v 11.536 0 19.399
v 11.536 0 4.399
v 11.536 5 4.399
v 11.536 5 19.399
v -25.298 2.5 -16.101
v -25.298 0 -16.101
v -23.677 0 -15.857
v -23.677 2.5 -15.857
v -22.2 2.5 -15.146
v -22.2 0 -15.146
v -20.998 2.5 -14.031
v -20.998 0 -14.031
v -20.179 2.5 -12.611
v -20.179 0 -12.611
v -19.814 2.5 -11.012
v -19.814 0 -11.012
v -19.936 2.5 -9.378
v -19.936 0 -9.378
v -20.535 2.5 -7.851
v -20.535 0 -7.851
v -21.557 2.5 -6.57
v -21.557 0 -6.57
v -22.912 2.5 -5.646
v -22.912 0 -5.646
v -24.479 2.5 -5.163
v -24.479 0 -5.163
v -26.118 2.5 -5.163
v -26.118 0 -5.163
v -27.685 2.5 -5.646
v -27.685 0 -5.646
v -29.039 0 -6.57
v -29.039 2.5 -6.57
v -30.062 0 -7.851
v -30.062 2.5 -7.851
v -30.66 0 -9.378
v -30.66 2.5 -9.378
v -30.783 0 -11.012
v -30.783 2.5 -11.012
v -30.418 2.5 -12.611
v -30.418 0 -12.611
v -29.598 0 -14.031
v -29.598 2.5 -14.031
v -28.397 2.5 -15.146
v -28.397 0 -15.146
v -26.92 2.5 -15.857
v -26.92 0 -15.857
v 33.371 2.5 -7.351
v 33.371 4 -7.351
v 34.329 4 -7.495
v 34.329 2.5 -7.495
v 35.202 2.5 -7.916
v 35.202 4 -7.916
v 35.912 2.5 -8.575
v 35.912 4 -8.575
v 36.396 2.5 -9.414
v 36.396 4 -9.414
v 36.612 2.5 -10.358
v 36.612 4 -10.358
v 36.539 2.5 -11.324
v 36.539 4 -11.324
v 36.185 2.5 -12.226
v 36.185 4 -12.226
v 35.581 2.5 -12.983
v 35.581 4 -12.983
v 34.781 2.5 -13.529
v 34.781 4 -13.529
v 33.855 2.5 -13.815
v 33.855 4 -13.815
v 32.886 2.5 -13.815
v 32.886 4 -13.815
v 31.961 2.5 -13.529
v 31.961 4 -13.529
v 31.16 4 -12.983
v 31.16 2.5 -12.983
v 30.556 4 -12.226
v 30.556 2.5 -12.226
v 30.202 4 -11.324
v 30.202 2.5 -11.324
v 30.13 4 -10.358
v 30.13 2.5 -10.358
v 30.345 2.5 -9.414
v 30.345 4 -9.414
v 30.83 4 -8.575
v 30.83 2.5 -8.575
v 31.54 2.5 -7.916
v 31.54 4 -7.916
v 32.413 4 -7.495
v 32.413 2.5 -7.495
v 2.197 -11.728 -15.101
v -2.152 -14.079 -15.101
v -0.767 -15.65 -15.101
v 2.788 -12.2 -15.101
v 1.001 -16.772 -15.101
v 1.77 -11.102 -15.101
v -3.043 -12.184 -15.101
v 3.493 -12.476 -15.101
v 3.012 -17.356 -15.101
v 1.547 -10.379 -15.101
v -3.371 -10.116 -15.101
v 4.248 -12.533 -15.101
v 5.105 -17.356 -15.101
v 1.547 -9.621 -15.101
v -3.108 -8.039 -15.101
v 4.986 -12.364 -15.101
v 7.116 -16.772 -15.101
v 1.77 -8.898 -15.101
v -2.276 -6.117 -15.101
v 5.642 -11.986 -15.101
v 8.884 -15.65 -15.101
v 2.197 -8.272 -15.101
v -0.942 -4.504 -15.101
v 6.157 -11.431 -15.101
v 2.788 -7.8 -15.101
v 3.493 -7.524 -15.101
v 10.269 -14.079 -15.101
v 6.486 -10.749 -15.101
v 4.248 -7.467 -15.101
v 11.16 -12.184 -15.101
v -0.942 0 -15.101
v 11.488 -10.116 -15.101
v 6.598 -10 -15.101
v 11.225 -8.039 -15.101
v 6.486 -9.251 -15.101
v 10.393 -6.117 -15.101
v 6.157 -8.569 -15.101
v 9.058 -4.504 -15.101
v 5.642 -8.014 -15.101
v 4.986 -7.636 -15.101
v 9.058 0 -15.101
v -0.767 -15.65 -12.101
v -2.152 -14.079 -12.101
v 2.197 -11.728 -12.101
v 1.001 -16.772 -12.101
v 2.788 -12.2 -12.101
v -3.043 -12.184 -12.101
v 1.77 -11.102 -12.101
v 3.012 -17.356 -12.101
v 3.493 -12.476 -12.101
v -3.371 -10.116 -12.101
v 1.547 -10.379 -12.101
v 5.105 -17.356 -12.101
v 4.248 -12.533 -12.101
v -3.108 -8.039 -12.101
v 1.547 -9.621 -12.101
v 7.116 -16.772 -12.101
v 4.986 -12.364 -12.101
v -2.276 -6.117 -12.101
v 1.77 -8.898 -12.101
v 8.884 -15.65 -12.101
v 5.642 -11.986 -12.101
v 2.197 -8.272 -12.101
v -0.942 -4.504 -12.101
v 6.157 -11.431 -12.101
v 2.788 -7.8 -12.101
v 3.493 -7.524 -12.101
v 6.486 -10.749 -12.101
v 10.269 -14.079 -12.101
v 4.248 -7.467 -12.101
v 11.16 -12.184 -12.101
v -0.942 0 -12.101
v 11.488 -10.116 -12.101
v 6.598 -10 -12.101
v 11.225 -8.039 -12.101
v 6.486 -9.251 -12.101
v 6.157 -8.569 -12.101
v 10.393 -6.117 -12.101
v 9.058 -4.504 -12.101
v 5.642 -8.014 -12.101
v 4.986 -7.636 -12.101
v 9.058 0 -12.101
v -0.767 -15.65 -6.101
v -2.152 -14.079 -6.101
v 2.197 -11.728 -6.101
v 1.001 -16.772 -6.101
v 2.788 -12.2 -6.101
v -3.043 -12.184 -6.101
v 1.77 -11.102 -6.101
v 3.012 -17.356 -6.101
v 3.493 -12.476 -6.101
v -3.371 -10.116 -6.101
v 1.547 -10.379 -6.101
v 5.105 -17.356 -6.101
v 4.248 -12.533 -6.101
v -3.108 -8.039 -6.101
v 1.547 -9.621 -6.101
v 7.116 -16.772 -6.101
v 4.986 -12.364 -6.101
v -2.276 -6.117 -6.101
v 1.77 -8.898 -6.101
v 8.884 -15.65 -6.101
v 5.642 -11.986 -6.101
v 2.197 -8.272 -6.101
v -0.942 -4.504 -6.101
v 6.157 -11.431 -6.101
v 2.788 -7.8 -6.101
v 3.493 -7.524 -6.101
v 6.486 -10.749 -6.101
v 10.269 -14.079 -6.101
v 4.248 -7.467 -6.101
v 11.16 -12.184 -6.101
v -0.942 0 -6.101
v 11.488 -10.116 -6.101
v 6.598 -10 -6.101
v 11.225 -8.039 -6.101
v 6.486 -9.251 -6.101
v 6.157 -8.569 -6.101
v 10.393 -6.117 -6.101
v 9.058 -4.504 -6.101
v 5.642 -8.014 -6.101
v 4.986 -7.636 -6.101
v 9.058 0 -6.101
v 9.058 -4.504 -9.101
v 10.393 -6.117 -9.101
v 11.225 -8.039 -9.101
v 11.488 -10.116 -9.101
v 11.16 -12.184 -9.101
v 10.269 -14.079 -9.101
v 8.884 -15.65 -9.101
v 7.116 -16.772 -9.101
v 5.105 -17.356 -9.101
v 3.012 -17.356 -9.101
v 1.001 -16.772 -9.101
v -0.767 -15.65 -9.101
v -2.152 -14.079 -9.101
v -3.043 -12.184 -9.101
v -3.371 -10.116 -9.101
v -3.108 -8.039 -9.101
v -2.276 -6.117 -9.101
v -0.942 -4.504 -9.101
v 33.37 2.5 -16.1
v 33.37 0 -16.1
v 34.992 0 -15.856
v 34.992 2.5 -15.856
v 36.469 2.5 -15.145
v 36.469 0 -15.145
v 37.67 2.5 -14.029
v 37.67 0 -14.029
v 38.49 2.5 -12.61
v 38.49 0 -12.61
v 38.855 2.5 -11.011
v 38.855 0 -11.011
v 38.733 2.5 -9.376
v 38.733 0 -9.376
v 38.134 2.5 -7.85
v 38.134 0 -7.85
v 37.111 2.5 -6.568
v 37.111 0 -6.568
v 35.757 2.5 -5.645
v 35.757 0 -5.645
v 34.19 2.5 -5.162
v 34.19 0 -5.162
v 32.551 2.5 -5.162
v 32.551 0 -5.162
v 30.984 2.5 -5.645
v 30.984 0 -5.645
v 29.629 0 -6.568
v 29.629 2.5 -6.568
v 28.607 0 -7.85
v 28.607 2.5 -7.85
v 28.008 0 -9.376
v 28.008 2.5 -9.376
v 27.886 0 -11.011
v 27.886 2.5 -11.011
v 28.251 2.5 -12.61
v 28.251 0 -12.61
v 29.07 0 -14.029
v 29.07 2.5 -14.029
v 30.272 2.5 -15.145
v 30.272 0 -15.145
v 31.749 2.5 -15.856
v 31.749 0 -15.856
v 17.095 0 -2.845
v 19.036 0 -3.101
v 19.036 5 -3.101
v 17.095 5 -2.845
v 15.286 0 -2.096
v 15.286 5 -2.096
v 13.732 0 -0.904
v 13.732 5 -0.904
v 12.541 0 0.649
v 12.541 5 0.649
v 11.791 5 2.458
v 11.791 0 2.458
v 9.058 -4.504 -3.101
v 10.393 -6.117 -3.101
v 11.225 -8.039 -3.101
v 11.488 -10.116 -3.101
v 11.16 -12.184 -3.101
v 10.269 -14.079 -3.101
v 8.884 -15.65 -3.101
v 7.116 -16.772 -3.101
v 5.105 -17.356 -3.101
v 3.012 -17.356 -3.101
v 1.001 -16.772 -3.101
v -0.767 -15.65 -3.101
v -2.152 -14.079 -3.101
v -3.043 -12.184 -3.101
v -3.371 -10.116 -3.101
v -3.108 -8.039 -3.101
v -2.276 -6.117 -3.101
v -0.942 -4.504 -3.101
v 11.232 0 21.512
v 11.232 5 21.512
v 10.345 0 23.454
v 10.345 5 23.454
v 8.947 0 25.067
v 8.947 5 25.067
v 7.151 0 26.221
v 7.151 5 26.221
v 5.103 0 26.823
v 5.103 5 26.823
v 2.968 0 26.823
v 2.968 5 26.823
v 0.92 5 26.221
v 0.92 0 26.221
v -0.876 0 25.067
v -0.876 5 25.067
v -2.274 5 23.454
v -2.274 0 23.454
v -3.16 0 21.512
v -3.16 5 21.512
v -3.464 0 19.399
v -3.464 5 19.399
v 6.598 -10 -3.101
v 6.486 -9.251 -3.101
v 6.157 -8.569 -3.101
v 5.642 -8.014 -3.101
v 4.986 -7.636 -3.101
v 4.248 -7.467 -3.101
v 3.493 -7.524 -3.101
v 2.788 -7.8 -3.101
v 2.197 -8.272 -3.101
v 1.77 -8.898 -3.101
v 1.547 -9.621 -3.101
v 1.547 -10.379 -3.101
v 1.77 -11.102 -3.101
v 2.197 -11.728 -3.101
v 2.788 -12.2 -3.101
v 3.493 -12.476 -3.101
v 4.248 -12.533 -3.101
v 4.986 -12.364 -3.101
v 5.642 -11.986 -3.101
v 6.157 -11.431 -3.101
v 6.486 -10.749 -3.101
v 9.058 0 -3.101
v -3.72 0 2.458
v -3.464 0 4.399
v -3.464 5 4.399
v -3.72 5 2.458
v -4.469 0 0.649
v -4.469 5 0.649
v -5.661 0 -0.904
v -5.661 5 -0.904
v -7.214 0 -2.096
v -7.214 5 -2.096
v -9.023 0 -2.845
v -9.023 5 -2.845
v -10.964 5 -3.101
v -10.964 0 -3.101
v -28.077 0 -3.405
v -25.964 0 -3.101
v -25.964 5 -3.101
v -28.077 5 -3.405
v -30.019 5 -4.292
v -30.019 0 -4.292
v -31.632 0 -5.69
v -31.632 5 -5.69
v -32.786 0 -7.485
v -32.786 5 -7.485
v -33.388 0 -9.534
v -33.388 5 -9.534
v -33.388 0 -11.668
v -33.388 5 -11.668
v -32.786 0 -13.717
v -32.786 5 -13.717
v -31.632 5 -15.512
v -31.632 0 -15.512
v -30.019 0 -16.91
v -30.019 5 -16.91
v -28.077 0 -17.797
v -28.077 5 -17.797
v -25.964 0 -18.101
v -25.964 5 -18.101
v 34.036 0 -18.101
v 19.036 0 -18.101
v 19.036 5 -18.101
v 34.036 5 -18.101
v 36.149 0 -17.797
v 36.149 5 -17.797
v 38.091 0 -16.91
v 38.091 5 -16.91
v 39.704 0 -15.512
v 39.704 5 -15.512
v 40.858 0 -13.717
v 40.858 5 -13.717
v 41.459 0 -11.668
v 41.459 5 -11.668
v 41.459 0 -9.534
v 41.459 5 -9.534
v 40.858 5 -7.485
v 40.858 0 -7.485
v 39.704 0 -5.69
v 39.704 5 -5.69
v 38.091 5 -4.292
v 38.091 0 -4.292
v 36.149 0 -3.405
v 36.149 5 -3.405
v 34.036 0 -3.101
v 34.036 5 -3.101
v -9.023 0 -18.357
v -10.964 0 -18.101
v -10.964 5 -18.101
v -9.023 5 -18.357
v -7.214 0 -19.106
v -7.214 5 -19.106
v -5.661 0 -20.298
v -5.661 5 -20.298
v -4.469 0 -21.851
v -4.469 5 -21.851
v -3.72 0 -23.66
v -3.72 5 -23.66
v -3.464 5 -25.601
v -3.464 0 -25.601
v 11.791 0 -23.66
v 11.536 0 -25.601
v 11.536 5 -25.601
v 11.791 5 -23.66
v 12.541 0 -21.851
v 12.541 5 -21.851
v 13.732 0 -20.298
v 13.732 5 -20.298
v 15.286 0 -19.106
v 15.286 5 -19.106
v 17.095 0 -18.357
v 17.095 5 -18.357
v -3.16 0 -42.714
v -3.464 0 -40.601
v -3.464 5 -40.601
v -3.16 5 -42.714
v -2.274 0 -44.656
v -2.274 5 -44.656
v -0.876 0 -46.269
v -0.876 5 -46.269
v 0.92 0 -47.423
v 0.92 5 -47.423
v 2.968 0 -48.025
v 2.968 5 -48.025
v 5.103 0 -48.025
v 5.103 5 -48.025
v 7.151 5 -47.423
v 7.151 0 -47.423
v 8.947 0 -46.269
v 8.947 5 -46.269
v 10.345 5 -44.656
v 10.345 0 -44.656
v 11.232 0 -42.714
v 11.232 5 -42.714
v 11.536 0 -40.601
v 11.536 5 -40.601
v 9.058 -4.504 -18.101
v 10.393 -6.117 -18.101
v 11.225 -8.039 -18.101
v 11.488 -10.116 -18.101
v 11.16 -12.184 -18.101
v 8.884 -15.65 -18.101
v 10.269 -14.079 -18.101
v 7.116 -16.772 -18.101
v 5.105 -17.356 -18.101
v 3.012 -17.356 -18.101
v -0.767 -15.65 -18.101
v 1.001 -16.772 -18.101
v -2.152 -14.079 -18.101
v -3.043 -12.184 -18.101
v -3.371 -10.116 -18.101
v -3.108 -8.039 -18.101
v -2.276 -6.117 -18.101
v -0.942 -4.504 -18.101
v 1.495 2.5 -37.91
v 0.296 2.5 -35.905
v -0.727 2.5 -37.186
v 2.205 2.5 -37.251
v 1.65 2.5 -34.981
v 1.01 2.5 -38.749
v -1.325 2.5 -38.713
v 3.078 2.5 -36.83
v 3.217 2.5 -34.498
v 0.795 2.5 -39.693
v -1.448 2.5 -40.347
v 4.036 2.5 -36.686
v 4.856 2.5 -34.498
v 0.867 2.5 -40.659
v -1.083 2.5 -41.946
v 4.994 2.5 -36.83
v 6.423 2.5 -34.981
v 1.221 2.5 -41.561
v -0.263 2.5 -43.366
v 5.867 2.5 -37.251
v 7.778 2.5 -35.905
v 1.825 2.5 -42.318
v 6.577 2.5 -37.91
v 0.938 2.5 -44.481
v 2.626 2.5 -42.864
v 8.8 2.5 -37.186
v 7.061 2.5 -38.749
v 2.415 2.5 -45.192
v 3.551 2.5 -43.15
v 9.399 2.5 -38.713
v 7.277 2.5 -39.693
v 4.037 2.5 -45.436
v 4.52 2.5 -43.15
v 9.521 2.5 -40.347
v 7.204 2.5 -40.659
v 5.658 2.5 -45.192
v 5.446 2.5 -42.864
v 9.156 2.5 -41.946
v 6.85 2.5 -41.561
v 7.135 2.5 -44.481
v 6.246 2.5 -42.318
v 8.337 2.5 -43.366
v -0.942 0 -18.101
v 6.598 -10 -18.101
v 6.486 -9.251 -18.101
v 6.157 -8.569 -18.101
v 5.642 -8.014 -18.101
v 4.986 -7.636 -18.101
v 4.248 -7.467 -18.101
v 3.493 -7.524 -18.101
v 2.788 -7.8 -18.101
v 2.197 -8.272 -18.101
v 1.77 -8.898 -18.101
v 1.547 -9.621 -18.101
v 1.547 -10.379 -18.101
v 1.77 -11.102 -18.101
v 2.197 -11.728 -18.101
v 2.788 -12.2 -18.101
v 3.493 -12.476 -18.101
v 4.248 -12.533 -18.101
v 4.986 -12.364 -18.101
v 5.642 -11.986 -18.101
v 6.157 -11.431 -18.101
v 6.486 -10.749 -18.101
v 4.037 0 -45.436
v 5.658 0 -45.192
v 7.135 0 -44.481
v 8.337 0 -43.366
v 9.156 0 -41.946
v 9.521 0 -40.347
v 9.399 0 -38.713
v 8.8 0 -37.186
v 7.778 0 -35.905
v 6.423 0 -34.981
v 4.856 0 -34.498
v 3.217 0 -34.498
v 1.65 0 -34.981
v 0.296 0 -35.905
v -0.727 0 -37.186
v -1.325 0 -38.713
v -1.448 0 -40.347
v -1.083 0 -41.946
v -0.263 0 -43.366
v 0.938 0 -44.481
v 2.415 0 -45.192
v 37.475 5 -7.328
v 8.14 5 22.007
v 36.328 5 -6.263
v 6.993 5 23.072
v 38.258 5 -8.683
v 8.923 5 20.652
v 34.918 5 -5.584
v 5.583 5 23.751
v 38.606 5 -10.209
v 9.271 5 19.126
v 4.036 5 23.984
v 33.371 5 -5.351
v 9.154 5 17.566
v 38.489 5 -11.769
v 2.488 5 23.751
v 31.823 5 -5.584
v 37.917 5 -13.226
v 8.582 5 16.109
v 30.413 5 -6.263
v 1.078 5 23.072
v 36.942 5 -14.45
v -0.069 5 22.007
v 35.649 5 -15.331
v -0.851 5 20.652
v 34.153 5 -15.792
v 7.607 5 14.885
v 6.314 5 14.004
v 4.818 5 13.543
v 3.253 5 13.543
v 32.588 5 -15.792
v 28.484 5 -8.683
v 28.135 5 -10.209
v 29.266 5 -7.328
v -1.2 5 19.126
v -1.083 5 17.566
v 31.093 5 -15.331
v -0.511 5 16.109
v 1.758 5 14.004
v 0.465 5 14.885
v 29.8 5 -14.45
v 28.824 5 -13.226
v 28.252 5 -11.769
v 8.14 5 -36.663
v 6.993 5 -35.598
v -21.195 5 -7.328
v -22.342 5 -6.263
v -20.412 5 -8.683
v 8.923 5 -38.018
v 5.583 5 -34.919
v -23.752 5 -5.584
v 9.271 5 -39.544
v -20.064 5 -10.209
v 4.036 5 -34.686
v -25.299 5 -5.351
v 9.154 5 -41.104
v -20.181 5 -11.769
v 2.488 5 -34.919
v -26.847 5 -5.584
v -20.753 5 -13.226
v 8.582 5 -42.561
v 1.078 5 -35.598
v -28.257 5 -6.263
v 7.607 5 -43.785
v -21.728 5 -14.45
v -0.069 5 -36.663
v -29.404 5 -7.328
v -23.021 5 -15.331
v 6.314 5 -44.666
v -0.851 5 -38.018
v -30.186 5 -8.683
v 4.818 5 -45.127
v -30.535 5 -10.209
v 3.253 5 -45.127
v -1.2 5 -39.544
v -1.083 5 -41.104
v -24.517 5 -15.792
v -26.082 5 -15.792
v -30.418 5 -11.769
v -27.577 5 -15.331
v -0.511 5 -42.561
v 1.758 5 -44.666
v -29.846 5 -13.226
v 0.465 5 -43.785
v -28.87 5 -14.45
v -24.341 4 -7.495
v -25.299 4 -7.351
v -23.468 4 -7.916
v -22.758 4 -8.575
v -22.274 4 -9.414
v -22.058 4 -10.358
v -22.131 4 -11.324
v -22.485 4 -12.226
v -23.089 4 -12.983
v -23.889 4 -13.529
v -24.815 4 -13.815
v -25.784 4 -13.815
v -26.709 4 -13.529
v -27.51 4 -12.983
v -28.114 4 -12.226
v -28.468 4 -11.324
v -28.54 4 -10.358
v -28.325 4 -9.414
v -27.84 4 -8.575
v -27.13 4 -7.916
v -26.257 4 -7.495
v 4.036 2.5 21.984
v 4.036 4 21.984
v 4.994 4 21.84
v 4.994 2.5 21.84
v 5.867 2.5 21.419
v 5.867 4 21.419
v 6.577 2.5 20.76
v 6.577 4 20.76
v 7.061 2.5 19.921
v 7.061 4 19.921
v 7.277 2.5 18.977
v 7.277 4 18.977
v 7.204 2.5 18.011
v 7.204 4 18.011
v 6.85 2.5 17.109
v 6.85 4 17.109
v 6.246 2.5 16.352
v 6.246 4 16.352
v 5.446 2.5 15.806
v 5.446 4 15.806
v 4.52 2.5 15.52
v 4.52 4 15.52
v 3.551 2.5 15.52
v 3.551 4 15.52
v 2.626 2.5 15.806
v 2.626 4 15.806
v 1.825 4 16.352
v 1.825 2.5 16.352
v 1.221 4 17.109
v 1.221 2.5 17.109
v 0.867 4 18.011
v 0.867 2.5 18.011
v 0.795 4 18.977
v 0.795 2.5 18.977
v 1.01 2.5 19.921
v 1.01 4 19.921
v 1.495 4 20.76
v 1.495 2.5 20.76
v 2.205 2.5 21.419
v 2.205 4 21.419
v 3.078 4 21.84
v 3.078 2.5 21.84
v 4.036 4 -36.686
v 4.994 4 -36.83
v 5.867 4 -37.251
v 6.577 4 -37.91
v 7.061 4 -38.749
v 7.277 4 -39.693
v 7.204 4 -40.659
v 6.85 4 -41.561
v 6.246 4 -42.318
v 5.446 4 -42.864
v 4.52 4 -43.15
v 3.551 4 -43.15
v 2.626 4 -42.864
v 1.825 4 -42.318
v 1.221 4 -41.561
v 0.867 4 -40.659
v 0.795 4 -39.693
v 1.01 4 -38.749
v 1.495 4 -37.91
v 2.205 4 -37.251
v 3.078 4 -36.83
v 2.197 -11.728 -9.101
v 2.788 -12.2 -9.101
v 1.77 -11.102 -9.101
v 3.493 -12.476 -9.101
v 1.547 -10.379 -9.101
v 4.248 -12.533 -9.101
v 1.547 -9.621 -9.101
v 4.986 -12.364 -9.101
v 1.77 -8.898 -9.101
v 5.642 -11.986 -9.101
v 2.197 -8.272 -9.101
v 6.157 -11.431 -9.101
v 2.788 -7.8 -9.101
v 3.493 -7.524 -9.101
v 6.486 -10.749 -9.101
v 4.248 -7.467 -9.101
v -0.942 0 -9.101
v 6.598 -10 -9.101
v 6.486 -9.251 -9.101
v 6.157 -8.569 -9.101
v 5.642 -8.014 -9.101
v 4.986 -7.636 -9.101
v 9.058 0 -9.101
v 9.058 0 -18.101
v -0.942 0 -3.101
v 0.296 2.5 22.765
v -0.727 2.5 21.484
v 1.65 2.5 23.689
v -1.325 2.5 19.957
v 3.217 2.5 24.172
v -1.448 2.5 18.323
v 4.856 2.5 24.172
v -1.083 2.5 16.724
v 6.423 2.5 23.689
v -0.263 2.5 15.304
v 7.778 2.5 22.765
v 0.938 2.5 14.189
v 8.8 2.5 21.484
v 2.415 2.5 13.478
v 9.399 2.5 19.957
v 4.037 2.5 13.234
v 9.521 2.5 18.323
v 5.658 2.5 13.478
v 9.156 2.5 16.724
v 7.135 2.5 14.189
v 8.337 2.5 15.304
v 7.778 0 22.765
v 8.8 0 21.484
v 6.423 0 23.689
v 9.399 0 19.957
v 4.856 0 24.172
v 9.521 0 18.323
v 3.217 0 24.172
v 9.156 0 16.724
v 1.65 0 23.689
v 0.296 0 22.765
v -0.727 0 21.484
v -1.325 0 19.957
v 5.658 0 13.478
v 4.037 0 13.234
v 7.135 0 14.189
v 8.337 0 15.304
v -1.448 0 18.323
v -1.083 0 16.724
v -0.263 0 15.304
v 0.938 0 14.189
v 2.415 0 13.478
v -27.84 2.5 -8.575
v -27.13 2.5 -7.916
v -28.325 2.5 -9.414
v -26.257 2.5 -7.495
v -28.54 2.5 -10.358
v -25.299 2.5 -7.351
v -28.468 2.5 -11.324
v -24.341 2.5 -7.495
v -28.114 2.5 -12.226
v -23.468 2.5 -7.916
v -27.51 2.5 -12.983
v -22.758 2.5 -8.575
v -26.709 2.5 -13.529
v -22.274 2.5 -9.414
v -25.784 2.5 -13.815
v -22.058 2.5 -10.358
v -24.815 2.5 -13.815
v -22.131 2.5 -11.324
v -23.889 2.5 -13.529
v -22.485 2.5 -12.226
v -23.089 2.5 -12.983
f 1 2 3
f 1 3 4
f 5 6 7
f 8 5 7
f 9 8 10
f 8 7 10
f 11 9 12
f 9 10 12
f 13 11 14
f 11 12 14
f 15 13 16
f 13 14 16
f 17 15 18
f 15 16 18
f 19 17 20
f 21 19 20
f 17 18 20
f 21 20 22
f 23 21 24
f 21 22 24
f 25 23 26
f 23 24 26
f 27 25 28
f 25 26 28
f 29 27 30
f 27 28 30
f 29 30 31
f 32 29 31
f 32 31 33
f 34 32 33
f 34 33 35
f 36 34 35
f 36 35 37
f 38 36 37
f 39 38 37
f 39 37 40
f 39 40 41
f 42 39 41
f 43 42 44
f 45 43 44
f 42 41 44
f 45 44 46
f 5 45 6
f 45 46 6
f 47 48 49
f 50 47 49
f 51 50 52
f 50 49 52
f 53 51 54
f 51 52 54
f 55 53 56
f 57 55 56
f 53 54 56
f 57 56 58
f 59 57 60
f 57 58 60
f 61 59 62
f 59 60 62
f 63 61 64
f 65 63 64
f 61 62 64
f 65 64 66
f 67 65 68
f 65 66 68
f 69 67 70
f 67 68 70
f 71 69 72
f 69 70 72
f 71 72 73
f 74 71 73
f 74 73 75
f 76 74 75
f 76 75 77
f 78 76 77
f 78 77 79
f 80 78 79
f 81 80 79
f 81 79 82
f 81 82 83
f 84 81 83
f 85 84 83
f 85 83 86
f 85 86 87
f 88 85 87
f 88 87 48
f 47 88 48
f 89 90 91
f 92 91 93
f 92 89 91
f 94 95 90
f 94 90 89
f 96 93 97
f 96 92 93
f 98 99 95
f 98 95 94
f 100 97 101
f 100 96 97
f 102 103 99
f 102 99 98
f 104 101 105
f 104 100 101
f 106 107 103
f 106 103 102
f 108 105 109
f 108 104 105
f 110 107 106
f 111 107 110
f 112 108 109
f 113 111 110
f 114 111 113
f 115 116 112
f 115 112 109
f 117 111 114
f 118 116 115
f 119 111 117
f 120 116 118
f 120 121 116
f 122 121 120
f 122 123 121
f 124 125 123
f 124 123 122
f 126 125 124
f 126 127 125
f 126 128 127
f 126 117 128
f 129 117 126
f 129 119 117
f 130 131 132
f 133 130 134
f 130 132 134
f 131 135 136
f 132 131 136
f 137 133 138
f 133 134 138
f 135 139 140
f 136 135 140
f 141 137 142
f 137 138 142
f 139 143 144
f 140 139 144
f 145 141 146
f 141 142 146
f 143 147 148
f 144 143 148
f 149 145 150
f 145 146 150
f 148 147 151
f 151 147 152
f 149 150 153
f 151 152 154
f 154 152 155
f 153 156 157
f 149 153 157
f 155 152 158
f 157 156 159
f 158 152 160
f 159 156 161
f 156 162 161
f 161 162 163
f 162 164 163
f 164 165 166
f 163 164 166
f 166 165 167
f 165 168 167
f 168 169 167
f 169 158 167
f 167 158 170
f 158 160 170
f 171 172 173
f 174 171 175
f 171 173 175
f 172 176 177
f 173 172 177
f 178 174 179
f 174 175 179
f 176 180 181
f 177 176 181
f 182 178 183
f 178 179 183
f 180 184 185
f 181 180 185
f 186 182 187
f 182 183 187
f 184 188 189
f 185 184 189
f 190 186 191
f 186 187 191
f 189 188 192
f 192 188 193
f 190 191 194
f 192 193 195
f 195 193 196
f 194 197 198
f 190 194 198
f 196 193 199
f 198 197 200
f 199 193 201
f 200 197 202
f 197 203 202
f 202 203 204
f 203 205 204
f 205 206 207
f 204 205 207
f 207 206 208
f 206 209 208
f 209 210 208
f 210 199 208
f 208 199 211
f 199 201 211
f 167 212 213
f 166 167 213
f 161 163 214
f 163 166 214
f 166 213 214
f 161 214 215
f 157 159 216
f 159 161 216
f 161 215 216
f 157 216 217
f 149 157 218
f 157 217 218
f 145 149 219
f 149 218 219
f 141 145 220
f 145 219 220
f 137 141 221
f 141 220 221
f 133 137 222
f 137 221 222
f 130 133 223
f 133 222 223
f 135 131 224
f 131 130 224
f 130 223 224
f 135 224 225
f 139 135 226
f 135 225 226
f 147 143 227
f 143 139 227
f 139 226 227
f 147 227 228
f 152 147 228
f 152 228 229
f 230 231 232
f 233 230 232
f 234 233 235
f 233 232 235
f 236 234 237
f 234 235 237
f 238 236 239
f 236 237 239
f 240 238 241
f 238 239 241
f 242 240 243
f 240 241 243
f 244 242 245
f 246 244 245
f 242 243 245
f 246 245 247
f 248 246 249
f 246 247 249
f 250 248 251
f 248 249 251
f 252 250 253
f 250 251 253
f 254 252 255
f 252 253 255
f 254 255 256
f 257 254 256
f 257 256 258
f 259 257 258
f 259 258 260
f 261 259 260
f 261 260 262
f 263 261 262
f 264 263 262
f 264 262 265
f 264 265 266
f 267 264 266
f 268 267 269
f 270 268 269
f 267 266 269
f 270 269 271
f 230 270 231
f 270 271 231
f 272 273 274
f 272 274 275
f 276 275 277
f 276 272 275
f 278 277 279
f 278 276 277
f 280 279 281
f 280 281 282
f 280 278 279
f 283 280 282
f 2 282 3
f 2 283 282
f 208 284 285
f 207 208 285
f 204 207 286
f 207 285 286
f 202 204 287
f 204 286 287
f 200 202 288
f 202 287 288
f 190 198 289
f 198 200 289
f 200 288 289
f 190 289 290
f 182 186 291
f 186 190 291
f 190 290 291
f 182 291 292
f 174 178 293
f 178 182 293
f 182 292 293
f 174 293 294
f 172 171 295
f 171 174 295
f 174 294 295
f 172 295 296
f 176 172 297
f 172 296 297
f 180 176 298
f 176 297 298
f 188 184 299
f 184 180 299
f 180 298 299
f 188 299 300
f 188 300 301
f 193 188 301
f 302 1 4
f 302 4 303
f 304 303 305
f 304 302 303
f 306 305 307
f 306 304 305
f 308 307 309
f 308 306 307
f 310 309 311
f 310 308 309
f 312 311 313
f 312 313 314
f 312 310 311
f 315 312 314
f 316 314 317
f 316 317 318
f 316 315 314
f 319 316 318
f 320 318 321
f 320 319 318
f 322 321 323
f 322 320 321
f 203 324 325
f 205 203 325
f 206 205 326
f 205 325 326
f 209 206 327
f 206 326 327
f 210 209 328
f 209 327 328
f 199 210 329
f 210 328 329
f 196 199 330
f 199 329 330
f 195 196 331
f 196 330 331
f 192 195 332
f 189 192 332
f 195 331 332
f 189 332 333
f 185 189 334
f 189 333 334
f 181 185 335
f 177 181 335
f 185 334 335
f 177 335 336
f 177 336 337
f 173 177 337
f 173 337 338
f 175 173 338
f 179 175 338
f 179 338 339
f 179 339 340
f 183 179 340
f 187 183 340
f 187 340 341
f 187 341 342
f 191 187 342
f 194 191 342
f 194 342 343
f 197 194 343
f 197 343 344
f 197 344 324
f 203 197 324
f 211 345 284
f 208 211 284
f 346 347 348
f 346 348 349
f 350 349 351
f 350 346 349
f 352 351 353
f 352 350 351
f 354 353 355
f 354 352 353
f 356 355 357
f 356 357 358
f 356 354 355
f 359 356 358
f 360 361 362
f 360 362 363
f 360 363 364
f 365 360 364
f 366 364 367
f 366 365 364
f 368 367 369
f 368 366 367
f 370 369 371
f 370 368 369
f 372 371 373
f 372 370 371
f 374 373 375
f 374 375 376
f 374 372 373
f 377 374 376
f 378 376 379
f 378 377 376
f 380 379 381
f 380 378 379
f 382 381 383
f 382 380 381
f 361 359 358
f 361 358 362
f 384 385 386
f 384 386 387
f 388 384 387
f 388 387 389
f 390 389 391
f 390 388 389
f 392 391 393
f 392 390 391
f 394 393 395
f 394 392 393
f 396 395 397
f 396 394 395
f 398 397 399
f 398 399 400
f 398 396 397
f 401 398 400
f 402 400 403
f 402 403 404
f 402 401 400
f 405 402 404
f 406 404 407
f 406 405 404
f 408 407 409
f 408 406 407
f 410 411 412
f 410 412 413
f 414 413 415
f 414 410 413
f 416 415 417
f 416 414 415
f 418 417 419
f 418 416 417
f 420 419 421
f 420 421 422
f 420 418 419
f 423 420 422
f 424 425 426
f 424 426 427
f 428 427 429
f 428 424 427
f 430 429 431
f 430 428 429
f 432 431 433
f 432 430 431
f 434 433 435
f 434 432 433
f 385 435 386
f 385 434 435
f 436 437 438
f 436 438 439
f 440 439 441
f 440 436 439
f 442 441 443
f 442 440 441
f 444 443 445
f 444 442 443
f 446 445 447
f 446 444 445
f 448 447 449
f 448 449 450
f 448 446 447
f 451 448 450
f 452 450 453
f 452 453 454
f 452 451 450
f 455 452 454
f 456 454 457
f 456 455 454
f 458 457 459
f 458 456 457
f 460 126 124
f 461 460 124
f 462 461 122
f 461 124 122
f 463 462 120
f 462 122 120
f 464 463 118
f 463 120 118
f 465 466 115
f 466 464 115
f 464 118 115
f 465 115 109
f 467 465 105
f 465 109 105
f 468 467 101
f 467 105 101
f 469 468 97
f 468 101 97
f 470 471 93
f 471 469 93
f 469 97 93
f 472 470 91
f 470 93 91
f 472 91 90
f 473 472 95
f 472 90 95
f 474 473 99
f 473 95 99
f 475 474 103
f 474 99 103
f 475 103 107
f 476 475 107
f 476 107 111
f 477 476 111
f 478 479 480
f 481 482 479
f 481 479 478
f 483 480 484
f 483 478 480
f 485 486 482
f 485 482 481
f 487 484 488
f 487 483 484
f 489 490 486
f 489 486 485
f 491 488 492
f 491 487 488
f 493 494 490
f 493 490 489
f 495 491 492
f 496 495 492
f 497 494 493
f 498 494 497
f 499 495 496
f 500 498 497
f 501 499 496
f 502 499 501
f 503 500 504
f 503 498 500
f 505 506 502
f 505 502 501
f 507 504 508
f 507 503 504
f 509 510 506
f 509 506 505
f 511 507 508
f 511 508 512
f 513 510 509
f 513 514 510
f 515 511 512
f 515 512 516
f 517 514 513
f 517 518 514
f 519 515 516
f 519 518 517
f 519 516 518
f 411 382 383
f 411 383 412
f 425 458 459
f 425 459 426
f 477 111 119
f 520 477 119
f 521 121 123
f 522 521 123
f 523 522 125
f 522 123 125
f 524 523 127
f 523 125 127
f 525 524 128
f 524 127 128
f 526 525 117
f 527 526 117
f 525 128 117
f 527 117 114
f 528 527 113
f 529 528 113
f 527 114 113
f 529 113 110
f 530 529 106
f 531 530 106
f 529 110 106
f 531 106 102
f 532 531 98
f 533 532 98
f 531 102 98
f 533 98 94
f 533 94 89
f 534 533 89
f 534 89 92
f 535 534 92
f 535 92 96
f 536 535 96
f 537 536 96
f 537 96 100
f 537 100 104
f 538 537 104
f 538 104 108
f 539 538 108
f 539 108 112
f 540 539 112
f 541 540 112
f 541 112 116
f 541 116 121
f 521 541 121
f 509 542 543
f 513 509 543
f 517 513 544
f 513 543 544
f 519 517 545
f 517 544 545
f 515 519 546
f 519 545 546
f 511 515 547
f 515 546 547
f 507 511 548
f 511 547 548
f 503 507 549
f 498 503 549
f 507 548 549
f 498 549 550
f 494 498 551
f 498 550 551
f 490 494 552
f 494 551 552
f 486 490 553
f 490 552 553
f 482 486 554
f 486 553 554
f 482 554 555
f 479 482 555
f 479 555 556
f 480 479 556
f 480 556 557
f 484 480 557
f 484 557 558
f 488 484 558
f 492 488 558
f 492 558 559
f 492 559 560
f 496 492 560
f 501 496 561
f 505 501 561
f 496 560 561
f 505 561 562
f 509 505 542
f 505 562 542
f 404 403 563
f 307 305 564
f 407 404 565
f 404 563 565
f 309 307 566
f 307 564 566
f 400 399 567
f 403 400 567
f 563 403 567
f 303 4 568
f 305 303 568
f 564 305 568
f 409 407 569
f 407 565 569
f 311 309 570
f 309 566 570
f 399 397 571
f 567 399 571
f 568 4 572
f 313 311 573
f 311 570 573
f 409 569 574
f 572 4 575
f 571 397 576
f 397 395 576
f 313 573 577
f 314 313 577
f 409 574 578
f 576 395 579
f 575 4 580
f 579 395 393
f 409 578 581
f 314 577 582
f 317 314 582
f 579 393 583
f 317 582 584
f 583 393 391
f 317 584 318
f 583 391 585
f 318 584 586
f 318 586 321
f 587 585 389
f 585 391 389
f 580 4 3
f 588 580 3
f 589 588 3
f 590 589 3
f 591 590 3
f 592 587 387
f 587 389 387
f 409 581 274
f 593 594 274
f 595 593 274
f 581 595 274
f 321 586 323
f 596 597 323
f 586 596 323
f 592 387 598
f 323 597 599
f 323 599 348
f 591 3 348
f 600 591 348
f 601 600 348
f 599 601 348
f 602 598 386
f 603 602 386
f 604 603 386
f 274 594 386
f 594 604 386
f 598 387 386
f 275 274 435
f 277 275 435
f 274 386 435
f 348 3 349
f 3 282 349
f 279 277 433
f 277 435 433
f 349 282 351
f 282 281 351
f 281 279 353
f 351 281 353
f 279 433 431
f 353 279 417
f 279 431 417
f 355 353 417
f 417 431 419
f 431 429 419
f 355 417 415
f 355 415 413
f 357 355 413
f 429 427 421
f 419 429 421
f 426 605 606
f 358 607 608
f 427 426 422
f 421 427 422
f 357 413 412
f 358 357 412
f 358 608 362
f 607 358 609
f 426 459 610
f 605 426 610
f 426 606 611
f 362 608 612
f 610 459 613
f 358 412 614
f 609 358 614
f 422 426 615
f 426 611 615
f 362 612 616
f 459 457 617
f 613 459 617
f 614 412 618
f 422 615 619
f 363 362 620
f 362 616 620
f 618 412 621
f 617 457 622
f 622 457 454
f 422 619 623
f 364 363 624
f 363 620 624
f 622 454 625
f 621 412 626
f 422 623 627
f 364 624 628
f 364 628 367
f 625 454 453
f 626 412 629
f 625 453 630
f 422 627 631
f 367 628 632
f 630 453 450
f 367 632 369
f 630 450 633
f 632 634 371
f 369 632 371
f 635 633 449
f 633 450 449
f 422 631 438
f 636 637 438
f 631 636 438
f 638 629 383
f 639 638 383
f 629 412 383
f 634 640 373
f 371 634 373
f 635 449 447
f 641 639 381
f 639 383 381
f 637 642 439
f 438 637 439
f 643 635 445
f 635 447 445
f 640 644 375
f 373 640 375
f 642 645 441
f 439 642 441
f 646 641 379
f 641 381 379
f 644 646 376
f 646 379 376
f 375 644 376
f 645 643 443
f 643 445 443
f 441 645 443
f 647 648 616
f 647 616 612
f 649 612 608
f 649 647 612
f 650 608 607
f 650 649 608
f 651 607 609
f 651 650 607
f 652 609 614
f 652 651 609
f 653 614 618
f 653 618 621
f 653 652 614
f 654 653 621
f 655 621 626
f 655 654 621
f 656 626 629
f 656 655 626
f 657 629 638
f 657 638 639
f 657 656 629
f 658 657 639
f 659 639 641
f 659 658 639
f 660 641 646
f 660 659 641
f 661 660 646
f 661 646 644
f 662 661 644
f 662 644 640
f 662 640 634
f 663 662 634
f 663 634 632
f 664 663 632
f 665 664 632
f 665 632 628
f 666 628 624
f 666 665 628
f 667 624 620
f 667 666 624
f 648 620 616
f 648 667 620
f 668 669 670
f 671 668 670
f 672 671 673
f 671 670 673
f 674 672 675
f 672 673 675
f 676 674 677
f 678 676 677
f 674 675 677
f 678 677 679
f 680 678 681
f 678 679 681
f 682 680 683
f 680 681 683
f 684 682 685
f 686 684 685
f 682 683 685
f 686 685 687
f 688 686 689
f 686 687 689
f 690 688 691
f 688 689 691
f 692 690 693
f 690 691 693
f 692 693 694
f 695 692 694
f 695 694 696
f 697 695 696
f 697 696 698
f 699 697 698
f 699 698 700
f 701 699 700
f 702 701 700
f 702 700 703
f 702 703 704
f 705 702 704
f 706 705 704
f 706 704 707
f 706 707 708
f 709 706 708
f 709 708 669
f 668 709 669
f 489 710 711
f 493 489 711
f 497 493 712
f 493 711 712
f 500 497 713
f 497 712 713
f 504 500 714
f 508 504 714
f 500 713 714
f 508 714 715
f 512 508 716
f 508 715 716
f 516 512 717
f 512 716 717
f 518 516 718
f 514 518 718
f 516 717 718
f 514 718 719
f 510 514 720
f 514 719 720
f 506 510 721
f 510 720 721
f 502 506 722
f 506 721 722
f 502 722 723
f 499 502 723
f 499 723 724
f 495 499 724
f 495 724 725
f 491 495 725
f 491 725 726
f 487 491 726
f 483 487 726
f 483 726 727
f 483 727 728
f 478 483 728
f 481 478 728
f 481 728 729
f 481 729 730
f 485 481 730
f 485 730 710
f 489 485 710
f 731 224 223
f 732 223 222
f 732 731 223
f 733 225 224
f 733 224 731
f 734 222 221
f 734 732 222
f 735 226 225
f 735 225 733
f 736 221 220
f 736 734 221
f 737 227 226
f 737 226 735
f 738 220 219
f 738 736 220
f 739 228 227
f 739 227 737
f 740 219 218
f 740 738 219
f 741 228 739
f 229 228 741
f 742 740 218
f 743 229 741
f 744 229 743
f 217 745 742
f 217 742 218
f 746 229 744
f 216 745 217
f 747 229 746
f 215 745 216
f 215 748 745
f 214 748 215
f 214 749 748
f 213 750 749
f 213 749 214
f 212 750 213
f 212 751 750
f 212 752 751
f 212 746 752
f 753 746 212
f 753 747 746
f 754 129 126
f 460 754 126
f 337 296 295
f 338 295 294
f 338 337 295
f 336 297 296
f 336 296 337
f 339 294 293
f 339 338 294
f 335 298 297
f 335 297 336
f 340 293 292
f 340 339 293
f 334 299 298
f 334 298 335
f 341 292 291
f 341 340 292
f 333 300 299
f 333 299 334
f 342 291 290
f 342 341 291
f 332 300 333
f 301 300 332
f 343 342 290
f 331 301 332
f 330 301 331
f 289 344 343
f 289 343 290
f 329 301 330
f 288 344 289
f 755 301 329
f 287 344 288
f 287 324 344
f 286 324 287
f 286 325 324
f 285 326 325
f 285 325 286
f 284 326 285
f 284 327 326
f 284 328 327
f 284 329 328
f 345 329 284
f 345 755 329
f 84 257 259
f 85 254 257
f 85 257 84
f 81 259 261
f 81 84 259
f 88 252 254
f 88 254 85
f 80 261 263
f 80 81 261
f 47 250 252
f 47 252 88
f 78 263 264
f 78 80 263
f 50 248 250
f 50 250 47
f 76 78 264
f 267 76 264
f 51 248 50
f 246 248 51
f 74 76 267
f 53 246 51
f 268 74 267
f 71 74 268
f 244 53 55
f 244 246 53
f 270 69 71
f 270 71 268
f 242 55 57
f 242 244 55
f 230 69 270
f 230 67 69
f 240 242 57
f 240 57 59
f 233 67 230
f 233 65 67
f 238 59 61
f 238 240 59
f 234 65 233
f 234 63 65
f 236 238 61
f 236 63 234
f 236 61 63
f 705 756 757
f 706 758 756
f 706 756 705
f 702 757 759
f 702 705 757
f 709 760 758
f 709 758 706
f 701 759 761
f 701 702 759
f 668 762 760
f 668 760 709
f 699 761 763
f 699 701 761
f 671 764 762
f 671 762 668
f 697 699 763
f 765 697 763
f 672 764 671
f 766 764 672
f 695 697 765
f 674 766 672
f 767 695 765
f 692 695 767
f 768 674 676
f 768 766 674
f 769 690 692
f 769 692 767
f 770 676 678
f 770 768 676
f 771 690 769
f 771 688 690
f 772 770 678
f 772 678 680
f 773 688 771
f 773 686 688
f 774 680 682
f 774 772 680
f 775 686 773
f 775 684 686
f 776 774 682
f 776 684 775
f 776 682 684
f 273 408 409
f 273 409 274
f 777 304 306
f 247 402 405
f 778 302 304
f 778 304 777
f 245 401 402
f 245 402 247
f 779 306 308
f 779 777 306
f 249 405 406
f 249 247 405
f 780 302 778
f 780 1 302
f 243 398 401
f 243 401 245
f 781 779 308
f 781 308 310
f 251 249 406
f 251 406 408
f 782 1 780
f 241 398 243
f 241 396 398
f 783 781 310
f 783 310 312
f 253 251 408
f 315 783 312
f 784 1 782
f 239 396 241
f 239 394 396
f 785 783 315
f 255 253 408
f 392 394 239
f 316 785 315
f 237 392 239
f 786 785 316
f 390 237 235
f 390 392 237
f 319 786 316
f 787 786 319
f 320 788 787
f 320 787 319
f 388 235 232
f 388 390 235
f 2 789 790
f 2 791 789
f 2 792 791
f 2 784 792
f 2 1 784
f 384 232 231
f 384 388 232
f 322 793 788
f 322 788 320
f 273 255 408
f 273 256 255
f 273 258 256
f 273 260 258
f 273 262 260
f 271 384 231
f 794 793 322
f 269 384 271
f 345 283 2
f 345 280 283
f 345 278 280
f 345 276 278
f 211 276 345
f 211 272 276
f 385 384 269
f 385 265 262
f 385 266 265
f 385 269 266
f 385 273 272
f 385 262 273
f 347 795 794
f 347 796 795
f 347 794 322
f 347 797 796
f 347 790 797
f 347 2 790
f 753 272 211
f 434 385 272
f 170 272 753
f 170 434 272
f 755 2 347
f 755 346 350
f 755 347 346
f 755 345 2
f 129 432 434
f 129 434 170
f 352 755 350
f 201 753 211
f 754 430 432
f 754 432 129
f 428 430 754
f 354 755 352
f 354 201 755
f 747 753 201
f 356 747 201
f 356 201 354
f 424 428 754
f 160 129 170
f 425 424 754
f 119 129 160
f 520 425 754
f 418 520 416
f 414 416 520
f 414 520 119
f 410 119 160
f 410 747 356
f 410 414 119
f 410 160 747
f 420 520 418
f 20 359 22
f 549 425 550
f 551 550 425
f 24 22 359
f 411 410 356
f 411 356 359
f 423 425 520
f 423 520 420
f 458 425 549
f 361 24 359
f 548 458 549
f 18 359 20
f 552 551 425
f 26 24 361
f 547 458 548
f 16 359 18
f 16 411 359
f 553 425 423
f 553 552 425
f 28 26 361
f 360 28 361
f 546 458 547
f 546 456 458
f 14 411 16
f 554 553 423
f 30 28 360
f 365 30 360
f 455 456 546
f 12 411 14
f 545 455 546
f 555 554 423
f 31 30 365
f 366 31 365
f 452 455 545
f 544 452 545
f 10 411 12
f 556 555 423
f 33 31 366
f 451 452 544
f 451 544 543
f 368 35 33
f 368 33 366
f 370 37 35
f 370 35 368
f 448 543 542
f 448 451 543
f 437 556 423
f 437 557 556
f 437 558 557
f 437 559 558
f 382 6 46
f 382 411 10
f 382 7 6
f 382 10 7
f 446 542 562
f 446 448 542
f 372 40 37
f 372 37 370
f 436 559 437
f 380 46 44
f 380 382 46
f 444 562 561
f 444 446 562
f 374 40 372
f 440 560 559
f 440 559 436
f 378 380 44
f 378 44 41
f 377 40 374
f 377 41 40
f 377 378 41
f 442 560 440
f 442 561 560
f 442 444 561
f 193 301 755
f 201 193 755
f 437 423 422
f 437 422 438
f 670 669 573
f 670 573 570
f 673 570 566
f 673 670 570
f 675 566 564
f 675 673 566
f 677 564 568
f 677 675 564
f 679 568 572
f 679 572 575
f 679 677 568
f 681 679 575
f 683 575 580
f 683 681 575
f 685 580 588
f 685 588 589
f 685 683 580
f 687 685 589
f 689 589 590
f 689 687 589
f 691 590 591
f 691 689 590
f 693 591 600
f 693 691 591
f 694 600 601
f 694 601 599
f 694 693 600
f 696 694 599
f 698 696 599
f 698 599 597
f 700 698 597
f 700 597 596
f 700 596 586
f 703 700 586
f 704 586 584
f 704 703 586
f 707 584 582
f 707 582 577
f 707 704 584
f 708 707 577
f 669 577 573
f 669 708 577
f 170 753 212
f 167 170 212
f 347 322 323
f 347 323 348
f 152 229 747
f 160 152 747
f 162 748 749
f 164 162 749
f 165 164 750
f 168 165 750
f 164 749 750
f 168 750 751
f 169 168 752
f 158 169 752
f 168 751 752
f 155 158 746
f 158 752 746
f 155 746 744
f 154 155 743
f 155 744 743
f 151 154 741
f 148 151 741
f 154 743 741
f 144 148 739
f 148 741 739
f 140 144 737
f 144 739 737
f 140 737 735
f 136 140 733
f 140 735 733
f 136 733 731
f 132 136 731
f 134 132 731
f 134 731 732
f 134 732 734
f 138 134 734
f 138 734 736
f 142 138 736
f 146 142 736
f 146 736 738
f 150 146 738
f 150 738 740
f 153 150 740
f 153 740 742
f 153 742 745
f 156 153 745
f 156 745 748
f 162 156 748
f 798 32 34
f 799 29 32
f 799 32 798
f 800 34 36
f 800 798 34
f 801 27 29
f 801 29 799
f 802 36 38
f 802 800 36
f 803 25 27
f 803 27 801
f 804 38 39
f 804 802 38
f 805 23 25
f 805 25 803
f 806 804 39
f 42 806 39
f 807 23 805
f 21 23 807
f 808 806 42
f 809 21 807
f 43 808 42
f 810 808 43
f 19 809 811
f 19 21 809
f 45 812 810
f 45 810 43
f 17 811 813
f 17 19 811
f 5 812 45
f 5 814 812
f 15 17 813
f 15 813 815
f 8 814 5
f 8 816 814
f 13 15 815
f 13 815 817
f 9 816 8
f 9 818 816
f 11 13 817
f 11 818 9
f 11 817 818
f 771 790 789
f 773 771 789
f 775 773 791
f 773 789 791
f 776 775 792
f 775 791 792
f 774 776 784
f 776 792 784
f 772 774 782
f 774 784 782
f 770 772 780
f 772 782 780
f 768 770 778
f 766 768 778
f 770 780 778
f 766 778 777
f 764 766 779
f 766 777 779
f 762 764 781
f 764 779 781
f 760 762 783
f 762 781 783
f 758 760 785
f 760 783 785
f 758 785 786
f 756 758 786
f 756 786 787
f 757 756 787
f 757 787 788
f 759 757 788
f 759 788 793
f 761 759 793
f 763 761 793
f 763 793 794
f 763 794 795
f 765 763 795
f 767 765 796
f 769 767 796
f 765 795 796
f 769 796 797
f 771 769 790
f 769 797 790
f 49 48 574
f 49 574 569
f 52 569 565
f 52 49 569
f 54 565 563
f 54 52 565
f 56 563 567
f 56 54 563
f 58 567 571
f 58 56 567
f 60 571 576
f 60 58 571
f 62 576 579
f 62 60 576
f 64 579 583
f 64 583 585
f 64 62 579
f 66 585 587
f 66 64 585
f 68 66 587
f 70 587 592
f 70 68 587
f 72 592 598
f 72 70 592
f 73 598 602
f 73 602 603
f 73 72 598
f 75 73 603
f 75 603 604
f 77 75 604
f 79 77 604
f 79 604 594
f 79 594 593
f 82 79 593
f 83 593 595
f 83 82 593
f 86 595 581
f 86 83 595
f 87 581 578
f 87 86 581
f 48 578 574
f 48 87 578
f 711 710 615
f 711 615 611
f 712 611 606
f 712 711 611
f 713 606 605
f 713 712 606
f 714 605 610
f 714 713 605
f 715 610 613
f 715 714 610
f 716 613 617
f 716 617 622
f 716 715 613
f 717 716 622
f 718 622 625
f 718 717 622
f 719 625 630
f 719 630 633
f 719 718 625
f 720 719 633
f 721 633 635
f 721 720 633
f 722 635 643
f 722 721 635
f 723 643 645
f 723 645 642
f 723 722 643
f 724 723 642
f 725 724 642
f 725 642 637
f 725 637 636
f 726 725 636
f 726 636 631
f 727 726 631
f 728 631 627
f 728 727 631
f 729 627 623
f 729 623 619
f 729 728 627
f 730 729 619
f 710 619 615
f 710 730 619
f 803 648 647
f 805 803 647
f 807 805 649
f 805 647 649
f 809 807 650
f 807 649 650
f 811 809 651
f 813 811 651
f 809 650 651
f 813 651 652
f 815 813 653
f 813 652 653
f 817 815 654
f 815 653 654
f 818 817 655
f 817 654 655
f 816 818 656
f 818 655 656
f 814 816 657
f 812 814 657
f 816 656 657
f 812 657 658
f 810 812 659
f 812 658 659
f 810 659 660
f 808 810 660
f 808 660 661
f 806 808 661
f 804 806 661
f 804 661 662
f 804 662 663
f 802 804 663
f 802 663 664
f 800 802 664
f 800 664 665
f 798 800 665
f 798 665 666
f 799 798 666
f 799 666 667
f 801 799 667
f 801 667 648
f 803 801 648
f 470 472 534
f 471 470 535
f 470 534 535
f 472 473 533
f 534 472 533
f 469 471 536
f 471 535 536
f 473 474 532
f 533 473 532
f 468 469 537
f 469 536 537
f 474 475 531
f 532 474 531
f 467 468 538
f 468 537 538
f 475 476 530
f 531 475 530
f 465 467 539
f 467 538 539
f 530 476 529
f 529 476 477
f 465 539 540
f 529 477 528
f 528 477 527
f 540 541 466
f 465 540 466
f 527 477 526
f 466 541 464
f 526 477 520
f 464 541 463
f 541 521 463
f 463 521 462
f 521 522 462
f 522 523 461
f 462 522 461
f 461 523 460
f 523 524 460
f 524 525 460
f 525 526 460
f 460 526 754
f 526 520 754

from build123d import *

# Parameters (mm, degrees)
ESTRUSIONE_ESTRUSIONE1_DEPTH = 5
SCHIZZO4_R                   = 3.25
TAGLIO_ESTRUSIONE1_DEPTH     = 64.748958347
SMUSSO2_SIZE                 = 2
SMUSSO2_SIZE2                = 1
SCHIZZO5_R                   = 5.5
TAGLIO_ESTRUSIONE2_DEPTH     = 2.5
SCHIZZO7_R                   = 2.54
ESTRUSIONE_ESTRUSIONE2_DEPTH = 20
SCHIZZO9_W                   = 20
SCHIZZO9_H                   = 3
SCHIZZO9_H_2                 = 4.712842408
SCHIZZO9_H_3                 = 4.145579672
TAGLIO_ESTRUSIONE3_DEPTH     = 20


with BuildPart() as part:
    # Schizzo3 → Estrusione-Estrusione1 (new body)
    with BuildSketch(Plane(origin=(0, 0, 0), x_dir=(1, 0, 0), z_dir=(0, 1, 0))):
        with BuildLine():
            Line((-25.964231013, 18.101035176), (-10.964231013, 18.101035176))
            ThreePointArc((-10.964231013, 18.101035176), (-5.660930154, 20.297734317), (-3.464231013, 25.601035176))
            Line((-3.464231013, 25.601035176), (-3.464231013, 40.601035176))
            ThreePointArc((-3.464231013, 40.601035176), (4.035768987, 48.101035176), (11.535768987, 40.601035176))
            Line((11.535768987, 40.601035176), (11.535768987, 25.601035176))
            ThreePointArc((11.535768987, 25.601035176), (13.732468128, 20.297734317), (19.035768987, 18.101035176))
            Line((19.035768987, 18.101035176), (34.035768987, 18.101035176))
            ThreePointArc((34.035768987, 18.101035176), (41.535768987, 10.601035176), (34.035768987, 3.101035176))
            Line((34.035768987, 3.101035176), (19.035768987, 3.101035176))
            ThreePointArc((19.035768987, 3.101035176), (13.732468128, 0.904336035), (11.535768987, -4.398964824))
            Line((11.535768987, -4.398964824), (11.535768987, -19.398964824))
            ThreePointArc((11.535768987, -19.398964824), (4.035768987, -26.898964824), (-3.464231013, -19.398964824))
            Line((-3.464231013, -19.398964824), (-3.464231013, -4.398964824))
            ThreePointArc((-3.464231013, -4.398964824), (-5.660930154, 0.904336035), (-10.964231013, 3.101035176))
            Line((-10.964231013, 3.101035176), (-25.964231013, 3.101035176))
            ThreePointArc((-25.964231013, 3.101035176), (-33.464231013, 10.601035176), (-25.964231013, 18.101035176))
        make_face()
    extrude(amount=ESTRUSIONE_ESTRUSIONE1_DEPTH)

    # Schizzo4 → Taglio-Estrusione1 (cut, through all)
    with BuildSketch(Plane(origin=(0, 5, 0), x_dir=(1, 0, 0), z_dir=(0, 1, 0))):
        with Locations(Location((4.035768987, -18.733964824, 0), (0, 0, 270))):
            Circle(SCHIZZO4_R)
        with Locations(Location((4.035768987, 39.936035176, 0), (0, 0, 270))):
            Circle(SCHIZZO4_R)
        with Locations(Location((-25.299231013, 10.601035176, 0), (0, 0, 270))):
            Circle(SCHIZZO4_R)
        with Locations(Location((33.370768987, 10.601035176, 0), (0, 0, 270))):
            Circle(SCHIZZO4_R)
    extrude(amount=-TAGLIO_ESTRUSIONE1_DEPTH, mode=Mode.SUBTRACT)

    # Smusso2
    smusso2_edges = [part.edges().sort_by_distance(p)[0] for p in [
        (4.035768987, 5, 15.483964824),
        (4.035768987, 5, -43.186035176),
        (-25.299231013, 5, -13.851035176),
        (33.370768987, 5, -13.851035176),
    ]]
    smusso2_side = [part.faces().sort_by_distance(p)[0] for p in [
        (4.035768987, 5, -10.601035176),
    ]]
    chamfer(smusso2_edges, length=SMUSSO2_SIZE, length2=SMUSSO2_SIZE2, reference=smusso2_side[0])

    # Schizzo5 → Taglio-Estrusione2 (cut)
    with BuildSketch(Plane.XZ):
        with Locations(Location((4.03661079, 18.733616138, 0), (0, 0, 270))):
            Circle(SCHIZZO5_R)
        with Locations(Location((4.03661079, -39.936383862, 0), (0, 0, 270))):
            Circle(SCHIZZO5_R)
        with Locations(Location((-25.29838921, -10.601383862, 0), (0, 0, 270))):
            Circle(SCHIZZO5_R)
        with Locations(Location((33.370420301, -10.600193374, 0), (0, 0, 270))):
            Circle(SCHIZZO5_R)
    extrude(amount=-TAGLIO_ESTRUSIONE2_DEPTH, mode=Mode.SUBTRACT)

    # Schizzo7 → Estrusione-Estrusione2 (add)
    with BuildSketch(Plane.XY):
        with BuildLine():
            Line((-0.941517405, -4.504101529), (-0.941517405, 0))
            Line((-0.941517405, 0), (9.058482595, 0))
            Line((9.058482595, 0), (9.058482595, -4.504101529))
            ThreePointArc((9.058482595, -4.504101529), (4.058482595, -17.43), (-0.941517405, -4.504101529))
        make_face()
        with Locations((4.058482595, -10)):
            Circle(SCHIZZO7_R, mode=Mode.SUBTRACT)
    extrude(amount=-ESTRUSIONE_ESTRUSIONE2_DEPTH)

    # Schizzo9 → Taglio-Estrusione3 (cut)
    with BuildSketch(Plane.XZ):
        with Locations((4.109140738, -7.601035176)):
            Rectangle(SCHIZZO9_W, SCHIZZO9_H)
        with Locations((4.109140738, -13.601035176)):
            Rectangle(SCHIZZO9_W, SCHIZZO9_H)
        with Locations((4.109140738, -0.744613972)):
            Rectangle(SCHIZZO9_W, SCHIZZO9_H_2)
        with Locations((4.109140738, -20.173825012)):
            Rectangle(SCHIZZO9_W, SCHIZZO9_H_3)
    extrude(amount=TAGLIO_ESTRUSIONE3_DEPTH, mode=Mode.SUBTRACT)


solid = part.part
